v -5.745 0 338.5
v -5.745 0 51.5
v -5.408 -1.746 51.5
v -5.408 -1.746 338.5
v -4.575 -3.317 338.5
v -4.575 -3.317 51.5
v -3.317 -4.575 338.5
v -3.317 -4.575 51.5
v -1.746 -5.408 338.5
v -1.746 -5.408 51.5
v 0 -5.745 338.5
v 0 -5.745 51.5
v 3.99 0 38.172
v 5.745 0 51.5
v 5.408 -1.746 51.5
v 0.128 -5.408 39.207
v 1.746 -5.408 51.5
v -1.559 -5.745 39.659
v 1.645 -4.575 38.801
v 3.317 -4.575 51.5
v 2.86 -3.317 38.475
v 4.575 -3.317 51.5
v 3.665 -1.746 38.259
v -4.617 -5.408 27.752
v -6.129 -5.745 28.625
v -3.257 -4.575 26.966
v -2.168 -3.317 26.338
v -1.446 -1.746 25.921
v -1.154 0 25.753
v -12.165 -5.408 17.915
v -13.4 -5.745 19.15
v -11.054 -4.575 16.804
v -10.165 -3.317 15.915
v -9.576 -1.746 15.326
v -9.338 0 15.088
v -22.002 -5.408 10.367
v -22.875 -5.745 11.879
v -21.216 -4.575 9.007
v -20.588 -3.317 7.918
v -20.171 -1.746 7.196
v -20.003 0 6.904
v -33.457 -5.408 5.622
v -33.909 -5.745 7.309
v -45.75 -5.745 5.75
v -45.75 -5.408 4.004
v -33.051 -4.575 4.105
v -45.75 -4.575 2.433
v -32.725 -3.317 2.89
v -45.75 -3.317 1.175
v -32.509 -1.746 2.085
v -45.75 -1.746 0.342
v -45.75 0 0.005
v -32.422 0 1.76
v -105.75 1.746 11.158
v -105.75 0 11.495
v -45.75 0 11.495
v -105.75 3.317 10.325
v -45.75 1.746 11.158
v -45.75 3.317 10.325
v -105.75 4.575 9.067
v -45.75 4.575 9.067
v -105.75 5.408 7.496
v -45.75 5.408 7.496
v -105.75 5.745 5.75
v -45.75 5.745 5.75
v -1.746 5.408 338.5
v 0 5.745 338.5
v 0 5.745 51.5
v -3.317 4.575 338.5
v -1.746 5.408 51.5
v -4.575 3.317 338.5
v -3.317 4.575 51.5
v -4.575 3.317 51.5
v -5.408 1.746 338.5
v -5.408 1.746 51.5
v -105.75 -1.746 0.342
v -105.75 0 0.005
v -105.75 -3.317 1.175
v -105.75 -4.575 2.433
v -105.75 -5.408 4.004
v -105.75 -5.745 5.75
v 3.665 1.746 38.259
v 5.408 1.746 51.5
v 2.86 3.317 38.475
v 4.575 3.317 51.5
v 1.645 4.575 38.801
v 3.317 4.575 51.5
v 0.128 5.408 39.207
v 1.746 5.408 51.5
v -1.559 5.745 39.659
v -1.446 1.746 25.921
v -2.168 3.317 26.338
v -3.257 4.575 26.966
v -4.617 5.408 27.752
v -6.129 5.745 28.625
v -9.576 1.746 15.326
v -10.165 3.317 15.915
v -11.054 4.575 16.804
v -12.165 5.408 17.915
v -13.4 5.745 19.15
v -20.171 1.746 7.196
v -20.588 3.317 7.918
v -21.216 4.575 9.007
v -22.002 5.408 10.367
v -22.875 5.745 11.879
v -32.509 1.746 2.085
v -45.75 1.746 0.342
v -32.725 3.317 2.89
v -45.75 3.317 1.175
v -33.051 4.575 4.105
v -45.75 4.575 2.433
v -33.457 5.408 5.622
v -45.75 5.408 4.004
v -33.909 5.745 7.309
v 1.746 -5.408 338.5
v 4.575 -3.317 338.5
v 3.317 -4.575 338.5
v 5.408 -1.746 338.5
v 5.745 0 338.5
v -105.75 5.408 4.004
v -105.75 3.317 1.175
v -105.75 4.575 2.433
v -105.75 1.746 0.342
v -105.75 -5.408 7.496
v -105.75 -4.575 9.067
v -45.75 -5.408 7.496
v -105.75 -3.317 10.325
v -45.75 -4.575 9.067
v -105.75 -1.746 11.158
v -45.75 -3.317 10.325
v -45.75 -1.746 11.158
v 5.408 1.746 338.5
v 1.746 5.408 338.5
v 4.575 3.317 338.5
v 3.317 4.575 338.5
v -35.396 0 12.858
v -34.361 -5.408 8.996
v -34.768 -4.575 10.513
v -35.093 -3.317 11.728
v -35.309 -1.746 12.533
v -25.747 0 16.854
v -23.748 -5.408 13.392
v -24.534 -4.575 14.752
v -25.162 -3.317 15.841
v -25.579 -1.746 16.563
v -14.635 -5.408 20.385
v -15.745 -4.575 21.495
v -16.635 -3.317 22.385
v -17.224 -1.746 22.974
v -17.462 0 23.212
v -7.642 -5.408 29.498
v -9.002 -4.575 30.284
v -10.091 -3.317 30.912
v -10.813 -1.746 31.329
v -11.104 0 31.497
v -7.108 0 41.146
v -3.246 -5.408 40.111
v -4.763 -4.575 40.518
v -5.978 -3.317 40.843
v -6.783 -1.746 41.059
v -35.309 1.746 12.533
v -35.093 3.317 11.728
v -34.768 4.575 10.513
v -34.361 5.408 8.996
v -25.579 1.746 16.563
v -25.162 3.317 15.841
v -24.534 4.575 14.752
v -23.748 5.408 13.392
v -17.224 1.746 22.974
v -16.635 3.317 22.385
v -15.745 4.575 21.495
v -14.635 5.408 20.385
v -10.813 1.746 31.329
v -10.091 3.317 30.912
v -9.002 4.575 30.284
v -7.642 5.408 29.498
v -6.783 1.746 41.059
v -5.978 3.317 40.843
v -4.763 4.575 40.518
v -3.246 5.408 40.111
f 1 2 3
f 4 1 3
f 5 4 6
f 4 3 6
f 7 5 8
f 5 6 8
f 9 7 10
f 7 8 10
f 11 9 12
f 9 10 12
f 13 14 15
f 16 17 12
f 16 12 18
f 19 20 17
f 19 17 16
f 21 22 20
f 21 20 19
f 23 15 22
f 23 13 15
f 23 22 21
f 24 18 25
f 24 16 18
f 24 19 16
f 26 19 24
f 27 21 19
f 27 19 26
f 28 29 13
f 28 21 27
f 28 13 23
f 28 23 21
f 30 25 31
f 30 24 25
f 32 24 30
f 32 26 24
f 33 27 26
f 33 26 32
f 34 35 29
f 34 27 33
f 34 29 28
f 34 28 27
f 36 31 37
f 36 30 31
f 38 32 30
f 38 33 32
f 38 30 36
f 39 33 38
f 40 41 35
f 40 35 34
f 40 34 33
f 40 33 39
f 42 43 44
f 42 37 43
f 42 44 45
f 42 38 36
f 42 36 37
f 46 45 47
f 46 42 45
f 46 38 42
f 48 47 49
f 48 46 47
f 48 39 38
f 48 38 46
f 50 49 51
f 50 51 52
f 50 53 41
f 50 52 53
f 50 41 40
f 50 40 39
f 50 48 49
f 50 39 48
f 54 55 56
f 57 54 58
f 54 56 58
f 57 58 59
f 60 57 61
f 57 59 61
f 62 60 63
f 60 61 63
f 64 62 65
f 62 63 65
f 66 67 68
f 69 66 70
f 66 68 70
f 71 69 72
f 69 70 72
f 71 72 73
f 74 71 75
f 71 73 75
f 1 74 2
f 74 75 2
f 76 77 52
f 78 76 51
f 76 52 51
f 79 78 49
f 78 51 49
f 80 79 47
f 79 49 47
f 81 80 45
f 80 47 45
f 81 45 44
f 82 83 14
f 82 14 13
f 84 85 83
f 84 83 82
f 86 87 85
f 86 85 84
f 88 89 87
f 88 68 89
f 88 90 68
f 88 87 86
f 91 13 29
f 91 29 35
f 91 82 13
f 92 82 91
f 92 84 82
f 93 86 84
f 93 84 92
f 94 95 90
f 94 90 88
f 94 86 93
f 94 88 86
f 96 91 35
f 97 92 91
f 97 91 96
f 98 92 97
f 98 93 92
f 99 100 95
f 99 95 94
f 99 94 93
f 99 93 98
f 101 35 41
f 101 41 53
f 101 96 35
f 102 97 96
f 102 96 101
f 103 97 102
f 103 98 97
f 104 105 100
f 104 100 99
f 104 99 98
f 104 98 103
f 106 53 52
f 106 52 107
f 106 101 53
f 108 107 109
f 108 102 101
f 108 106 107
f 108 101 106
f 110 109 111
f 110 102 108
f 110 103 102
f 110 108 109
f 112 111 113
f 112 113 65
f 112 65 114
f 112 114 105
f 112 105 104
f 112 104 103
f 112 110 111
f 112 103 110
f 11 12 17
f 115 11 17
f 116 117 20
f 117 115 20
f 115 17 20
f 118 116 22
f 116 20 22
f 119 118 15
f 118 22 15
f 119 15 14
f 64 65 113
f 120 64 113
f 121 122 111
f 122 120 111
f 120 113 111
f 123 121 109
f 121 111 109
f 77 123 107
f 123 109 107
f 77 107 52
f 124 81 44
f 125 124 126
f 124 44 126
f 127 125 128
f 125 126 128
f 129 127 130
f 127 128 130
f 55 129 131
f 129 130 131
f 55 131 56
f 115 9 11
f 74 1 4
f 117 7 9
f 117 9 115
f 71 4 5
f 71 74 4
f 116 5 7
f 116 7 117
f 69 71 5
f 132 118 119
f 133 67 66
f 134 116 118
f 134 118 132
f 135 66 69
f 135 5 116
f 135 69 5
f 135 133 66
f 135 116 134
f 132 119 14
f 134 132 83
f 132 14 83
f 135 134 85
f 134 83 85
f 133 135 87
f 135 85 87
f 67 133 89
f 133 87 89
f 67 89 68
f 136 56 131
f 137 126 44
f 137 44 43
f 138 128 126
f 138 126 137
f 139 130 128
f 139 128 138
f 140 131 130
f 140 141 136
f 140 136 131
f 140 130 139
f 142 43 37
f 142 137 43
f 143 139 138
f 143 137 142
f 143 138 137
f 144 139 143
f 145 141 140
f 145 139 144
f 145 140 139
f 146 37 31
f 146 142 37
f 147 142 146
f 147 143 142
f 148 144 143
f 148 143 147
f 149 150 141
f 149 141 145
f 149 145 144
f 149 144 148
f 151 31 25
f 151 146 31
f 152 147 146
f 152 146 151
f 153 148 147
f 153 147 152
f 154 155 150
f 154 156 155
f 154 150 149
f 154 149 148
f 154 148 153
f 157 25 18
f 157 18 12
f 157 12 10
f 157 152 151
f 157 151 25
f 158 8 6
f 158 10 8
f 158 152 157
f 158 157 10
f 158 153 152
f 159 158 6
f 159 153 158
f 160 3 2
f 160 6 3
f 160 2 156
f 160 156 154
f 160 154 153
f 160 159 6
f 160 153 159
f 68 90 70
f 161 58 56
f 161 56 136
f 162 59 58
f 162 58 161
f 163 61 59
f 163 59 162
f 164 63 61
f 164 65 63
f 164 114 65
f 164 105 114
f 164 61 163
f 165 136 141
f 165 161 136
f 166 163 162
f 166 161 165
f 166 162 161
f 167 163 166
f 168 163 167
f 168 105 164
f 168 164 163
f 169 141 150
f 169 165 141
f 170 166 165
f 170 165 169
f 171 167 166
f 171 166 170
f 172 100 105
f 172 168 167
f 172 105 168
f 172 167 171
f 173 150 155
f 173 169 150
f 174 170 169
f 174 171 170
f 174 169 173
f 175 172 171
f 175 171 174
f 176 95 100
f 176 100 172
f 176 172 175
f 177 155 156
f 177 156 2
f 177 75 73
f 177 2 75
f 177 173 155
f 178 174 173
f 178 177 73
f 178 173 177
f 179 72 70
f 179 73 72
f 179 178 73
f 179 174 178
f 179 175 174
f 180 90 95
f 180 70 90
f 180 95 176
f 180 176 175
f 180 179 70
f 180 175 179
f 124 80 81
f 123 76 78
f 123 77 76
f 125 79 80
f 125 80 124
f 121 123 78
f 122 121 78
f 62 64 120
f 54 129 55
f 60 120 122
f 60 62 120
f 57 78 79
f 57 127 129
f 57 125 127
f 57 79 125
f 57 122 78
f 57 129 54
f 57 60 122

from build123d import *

# Parameters (mm, degrees)
SKETCH1_W           = 11.5
SKETCH1_H           = 11.5
BOSS_EXTRUDE1_DEPTH = 338.5
SKETCH2_W           = 11.5
SKETCH2_H           = 11.5
BOSS_EXTRUDE2_DEPTH = 100
FILLET1_R           = 40
FILLET2_R           = 51.5
FILLET3_R           = 6


with BuildPart() as part:
    # Sketch1 → Boss-Extrude1 (new body)
    with BuildSketch(Plane.XY):
        Rectangle(SKETCH1_W, SKETCH1_H)
    extrude(amount=BOSS_EXTRUDE1_DEPTH)

    # Sketch2 → Boss-Extrude2 (add)
    with BuildSketch(Plane.ZY.offset(5.75)):
        with Locations((5.75, 0)):
            Rectangle(SKETCH2_W, SKETCH2_H)
    extrude(amount=BOSS_EXTRUDE2_DEPTH)

    # Fillet1
    fillet1_edges = [part.edges().sort_by_distance(p)[0] for p in [
        (-5.75, 0, 11.5),
    ]]
    fillet(fillet1_edges, radius=FILLET1_R)

    # Fillet2
    fillet2_edges = [part.edges().sort_by_distance(p)[0] for p in [
        (5.75, 0, 0),
    ]]
    fillet(fillet2_edges, radius=FILLET2_R)

    # Fillet3
    # the kernel refuses this fillet: 6 mm, written as the material it takes off along each edge
    with BuildSketch(Plane(origin=(-5.75, -5.75, 51.5), x_dir=(0, 1, 0), z_dir=(0, 0, 1)), Plane(origin=(-5.75, 5.75, 51.5), x_dir=(1, 0, 0), z_dir=(0, 0, 1))) as fillet3_piece_1:
        with BuildLine():
            CenterArc((FILLET3_R, -FILLET3_R), FILLET3_R, 90, 90)
            Line((0, -FILLET3_R), (0, 0))
            Line((0, 0), (FILLET3_R, 0))
        make_face()
    extrude(amount=302, mode=Mode.SUBTRACT)
    with BuildSketch(Plane(origin=(-45.75, -5.75, 51.5), x_dir=(0, 0, -1), z_dir=(-1, 0, 0))) as fillet3_piece_2:
        with BuildLine():
            CenterArc((40 + FILLET3_R, -FILLET3_R), FILLET3_R, 90, 90)
            Line((40 + FILLET3_R, 0), (40, 0))
            Line((40, 0), (40, -FILLET3_R))
        make_face()
    revolve(axis=Axis((-45.75, -5.75, 51.5), (0, -1, 0)), revolution_arc=90, mode=Mode.SUBTRACT)
    with BuildSketch(Plane(origin=(-45.75, 5.75, 51.5), x_dir=(0, 0, -1), z_dir=(-1, 0, 0))) as fillet3_piece_3:
        with BuildLine():
            CenterArc((40 + FILLET3_R, FILLET3_R), FILLET3_R, 180, 90)
            Line((40, FILLET3_R), (40, 0))
            Line((40, 0), (40 + FILLET3_R, 0))
        make_face()
    revolve(axis=Axis((-45.75, 5.75, 51.5), (0, -1, 0)), revolution_arc=90, mode=Mode.SUBTRACT)
    with BuildSketch(Plane(origin=(5.75, -5.75, 51.5), x_dir=(0, 1, 0), z_dir=(0, 0, 1)), Plane(origin=(5.75, 5.75, 51.5), x_dir=(-1, 0, 0), z_dir=(0, 0, 1))) as fillet3_piece_4:
        with BuildLine():
            CenterArc((FILLET3_R, FILLET3_R), FILLET3_R, 180, 90)
            Line((0, FILLET3_R), (0, 0))
            Line((0, 0), (FILLET3_R, 0))
        make_face()
    extrude(amount=302, mode=Mode.SUBTRACT)
    with BuildSketch(Plane(origin=(-45.75, -5.75, 51.5), x_dir=(1, 0, 0), z_dir=(0, 0, 1))) as fillet3_piece_5:
        with BuildLine():
            CenterArc((51.5 - FILLET3_R, FILLET3_R), FILLET3_R, 270, 90)
            Line((51.5 - FILLET3_R, 0), (51.5, 0))
            Line((51.5, 0), (51.5, FILLET3_R))
        make_face()
    revolve(axis=Axis((-45.75, -5.75, 51.5), (0, 1, 0)), revolution_arc=90, mode=Mode.SUBTRACT)
    with BuildSketch(Plane(origin=(-45.75, 5.75, 51.5), x_dir=(1, 0, 0), z_dir=(0, 0, 1))) as fillet3_piece_6:
        with BuildLine():
            CenterArc((51.5 - FILLET3_R, -FILLET3_R), FILLET3_R, 0, 90)
            Line((51.5, -FILLET3_R), (51.5, 0))
            Line((51.5, 0), (51.5 - FILLET3_R, 0))
        make_face()
    revolve(axis=Axis((-45.75, 5.75, 51.5), (0, 1, 0)), revolution_arc=90, mode=Mode.SUBTRACT)
    with BuildSketch(Plane(origin=(-45.75, -5.75, 11.5), x_dir=(0, 1, 0), z_dir=(-1, 0, 0)), Plane(origin=(-45.75, 5.75, 11.5), x_dir=(0, 0, -1), z_dir=(-1, 0, 0))) as fillet3_piece_7:
        with BuildLine():
            CenterArc((FILLET3_R, FILLET3_R), FILLET3_R, 180, 90)
            Line((0, FILLET3_R), (0, 0))
            Line((0, 0), (FILLET3_R, 0))
        make_face()
    extrude(amount=75, mode=Mode.SUBTRACT)
    with BuildSketch(Plane(origin=(-45.75, -5.75, 0), x_dir=(0, 1, 0), z_dir=(-1, 0, 0)), Plane(origin=(-45.75, 5.75, 0), x_dir=(0, 0, 1), z_dir=(-1, 0, 0))) as fillet3_piece_8:
        with BuildLine():
            CenterArc((FILLET3_R, -FILLET3_R), FILLET3_R, 90, 90)
            Line((0, -FILLET3_R), (0, 0))
            Line((0, 0), (FILLET3_R, 0))
        make_face()
    extrude(amount=75, mode=Mode.SUBTRACT)


solid = part.part
